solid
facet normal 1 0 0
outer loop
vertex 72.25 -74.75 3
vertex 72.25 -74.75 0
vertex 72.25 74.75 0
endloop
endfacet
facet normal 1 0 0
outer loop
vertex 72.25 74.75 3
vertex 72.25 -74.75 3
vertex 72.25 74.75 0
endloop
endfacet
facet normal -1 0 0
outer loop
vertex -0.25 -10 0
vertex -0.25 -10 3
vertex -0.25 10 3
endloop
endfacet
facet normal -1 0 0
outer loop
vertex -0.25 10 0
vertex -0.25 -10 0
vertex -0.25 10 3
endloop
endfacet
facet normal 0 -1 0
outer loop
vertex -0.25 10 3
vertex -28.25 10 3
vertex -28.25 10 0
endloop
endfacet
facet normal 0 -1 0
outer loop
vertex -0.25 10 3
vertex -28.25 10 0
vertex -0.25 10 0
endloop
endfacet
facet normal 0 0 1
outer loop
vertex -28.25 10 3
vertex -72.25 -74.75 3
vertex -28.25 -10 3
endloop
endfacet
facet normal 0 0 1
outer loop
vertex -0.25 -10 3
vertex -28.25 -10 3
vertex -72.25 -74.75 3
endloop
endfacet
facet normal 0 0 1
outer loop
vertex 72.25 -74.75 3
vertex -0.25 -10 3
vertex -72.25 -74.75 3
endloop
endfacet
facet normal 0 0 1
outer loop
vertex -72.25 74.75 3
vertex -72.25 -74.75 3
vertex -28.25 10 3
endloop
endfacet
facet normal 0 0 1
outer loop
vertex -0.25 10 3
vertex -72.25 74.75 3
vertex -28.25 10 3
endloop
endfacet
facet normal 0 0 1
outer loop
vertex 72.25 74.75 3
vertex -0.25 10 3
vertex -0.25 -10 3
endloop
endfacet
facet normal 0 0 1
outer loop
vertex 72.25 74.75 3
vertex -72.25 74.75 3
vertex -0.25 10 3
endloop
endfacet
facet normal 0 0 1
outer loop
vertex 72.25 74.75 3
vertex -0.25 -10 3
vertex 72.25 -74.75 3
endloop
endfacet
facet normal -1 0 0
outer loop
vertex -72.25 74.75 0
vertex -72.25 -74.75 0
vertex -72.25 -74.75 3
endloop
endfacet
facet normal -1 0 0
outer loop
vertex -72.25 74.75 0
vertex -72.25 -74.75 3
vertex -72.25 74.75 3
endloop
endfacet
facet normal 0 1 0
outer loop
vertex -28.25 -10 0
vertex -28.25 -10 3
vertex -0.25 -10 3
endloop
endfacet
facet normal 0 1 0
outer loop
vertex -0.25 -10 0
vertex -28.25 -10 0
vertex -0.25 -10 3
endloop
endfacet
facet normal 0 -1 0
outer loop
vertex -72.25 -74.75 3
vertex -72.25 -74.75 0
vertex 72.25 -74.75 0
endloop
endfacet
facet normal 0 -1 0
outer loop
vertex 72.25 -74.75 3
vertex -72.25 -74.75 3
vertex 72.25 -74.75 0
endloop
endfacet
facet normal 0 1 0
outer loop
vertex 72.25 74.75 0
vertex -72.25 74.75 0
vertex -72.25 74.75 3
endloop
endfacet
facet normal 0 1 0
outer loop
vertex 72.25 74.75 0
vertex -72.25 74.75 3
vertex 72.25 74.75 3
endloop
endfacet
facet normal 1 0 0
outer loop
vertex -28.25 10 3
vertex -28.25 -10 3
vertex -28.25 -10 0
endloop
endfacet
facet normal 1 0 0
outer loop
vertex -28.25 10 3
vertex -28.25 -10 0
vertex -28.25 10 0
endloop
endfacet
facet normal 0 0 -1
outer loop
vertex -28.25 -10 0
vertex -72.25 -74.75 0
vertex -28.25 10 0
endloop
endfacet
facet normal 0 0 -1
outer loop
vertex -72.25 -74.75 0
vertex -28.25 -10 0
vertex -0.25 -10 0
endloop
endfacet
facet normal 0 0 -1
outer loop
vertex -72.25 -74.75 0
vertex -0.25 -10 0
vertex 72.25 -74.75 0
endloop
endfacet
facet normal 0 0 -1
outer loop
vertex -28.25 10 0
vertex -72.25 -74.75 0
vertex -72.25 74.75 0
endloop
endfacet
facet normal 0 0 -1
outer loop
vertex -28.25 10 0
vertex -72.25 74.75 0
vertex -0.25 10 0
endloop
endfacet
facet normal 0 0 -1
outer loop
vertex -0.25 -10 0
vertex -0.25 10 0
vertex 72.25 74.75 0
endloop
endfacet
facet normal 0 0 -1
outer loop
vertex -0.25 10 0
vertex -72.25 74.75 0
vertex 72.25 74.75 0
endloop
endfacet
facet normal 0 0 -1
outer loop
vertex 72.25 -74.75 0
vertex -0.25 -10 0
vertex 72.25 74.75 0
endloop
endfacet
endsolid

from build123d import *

# Parameters (mm, degrees)
SKETCH1_W           = 144.5
SKETCH1_H           = 149.5
BOSS_EXTRUDE1_DEPTH = 3
CUT_EXTRUDE1_REACH  = 5
SKETCH2_W           = 28
SKETCH2_H           = 20


with BuildPart() as part:
    # Sketch1 → Boss-Extrude1 (new body)
    with BuildSketch(Plane.XY):
        Rectangle(SKETCH1_W, SKETCH1_H)
    extrude(amount=BOSS_EXTRUDE1_DEPTH)

    # Sketch2 → Cut-Extrude1 (cut, up to next)
    with BuildSketch(Plane.XY.offset(3), mode=Mode.PRIVATE) as cut_extrude1_sk1:
        with Locations((-14.25, 0)):
            Rectangle(SKETCH2_W, SKETCH2_H)
    cut_extrude1_tool1 = extrude(cut_extrude1_sk1.sketch, amount=-CUT_EXTRUDE1_REACH, mode=Mode.PRIVATE) & part.part
    add(cut_extrude1_tool1.solids().sort_by_distance((-14.25, 0, 3))[0], mode=Mode.SUBTRACT)


solid = part.part
